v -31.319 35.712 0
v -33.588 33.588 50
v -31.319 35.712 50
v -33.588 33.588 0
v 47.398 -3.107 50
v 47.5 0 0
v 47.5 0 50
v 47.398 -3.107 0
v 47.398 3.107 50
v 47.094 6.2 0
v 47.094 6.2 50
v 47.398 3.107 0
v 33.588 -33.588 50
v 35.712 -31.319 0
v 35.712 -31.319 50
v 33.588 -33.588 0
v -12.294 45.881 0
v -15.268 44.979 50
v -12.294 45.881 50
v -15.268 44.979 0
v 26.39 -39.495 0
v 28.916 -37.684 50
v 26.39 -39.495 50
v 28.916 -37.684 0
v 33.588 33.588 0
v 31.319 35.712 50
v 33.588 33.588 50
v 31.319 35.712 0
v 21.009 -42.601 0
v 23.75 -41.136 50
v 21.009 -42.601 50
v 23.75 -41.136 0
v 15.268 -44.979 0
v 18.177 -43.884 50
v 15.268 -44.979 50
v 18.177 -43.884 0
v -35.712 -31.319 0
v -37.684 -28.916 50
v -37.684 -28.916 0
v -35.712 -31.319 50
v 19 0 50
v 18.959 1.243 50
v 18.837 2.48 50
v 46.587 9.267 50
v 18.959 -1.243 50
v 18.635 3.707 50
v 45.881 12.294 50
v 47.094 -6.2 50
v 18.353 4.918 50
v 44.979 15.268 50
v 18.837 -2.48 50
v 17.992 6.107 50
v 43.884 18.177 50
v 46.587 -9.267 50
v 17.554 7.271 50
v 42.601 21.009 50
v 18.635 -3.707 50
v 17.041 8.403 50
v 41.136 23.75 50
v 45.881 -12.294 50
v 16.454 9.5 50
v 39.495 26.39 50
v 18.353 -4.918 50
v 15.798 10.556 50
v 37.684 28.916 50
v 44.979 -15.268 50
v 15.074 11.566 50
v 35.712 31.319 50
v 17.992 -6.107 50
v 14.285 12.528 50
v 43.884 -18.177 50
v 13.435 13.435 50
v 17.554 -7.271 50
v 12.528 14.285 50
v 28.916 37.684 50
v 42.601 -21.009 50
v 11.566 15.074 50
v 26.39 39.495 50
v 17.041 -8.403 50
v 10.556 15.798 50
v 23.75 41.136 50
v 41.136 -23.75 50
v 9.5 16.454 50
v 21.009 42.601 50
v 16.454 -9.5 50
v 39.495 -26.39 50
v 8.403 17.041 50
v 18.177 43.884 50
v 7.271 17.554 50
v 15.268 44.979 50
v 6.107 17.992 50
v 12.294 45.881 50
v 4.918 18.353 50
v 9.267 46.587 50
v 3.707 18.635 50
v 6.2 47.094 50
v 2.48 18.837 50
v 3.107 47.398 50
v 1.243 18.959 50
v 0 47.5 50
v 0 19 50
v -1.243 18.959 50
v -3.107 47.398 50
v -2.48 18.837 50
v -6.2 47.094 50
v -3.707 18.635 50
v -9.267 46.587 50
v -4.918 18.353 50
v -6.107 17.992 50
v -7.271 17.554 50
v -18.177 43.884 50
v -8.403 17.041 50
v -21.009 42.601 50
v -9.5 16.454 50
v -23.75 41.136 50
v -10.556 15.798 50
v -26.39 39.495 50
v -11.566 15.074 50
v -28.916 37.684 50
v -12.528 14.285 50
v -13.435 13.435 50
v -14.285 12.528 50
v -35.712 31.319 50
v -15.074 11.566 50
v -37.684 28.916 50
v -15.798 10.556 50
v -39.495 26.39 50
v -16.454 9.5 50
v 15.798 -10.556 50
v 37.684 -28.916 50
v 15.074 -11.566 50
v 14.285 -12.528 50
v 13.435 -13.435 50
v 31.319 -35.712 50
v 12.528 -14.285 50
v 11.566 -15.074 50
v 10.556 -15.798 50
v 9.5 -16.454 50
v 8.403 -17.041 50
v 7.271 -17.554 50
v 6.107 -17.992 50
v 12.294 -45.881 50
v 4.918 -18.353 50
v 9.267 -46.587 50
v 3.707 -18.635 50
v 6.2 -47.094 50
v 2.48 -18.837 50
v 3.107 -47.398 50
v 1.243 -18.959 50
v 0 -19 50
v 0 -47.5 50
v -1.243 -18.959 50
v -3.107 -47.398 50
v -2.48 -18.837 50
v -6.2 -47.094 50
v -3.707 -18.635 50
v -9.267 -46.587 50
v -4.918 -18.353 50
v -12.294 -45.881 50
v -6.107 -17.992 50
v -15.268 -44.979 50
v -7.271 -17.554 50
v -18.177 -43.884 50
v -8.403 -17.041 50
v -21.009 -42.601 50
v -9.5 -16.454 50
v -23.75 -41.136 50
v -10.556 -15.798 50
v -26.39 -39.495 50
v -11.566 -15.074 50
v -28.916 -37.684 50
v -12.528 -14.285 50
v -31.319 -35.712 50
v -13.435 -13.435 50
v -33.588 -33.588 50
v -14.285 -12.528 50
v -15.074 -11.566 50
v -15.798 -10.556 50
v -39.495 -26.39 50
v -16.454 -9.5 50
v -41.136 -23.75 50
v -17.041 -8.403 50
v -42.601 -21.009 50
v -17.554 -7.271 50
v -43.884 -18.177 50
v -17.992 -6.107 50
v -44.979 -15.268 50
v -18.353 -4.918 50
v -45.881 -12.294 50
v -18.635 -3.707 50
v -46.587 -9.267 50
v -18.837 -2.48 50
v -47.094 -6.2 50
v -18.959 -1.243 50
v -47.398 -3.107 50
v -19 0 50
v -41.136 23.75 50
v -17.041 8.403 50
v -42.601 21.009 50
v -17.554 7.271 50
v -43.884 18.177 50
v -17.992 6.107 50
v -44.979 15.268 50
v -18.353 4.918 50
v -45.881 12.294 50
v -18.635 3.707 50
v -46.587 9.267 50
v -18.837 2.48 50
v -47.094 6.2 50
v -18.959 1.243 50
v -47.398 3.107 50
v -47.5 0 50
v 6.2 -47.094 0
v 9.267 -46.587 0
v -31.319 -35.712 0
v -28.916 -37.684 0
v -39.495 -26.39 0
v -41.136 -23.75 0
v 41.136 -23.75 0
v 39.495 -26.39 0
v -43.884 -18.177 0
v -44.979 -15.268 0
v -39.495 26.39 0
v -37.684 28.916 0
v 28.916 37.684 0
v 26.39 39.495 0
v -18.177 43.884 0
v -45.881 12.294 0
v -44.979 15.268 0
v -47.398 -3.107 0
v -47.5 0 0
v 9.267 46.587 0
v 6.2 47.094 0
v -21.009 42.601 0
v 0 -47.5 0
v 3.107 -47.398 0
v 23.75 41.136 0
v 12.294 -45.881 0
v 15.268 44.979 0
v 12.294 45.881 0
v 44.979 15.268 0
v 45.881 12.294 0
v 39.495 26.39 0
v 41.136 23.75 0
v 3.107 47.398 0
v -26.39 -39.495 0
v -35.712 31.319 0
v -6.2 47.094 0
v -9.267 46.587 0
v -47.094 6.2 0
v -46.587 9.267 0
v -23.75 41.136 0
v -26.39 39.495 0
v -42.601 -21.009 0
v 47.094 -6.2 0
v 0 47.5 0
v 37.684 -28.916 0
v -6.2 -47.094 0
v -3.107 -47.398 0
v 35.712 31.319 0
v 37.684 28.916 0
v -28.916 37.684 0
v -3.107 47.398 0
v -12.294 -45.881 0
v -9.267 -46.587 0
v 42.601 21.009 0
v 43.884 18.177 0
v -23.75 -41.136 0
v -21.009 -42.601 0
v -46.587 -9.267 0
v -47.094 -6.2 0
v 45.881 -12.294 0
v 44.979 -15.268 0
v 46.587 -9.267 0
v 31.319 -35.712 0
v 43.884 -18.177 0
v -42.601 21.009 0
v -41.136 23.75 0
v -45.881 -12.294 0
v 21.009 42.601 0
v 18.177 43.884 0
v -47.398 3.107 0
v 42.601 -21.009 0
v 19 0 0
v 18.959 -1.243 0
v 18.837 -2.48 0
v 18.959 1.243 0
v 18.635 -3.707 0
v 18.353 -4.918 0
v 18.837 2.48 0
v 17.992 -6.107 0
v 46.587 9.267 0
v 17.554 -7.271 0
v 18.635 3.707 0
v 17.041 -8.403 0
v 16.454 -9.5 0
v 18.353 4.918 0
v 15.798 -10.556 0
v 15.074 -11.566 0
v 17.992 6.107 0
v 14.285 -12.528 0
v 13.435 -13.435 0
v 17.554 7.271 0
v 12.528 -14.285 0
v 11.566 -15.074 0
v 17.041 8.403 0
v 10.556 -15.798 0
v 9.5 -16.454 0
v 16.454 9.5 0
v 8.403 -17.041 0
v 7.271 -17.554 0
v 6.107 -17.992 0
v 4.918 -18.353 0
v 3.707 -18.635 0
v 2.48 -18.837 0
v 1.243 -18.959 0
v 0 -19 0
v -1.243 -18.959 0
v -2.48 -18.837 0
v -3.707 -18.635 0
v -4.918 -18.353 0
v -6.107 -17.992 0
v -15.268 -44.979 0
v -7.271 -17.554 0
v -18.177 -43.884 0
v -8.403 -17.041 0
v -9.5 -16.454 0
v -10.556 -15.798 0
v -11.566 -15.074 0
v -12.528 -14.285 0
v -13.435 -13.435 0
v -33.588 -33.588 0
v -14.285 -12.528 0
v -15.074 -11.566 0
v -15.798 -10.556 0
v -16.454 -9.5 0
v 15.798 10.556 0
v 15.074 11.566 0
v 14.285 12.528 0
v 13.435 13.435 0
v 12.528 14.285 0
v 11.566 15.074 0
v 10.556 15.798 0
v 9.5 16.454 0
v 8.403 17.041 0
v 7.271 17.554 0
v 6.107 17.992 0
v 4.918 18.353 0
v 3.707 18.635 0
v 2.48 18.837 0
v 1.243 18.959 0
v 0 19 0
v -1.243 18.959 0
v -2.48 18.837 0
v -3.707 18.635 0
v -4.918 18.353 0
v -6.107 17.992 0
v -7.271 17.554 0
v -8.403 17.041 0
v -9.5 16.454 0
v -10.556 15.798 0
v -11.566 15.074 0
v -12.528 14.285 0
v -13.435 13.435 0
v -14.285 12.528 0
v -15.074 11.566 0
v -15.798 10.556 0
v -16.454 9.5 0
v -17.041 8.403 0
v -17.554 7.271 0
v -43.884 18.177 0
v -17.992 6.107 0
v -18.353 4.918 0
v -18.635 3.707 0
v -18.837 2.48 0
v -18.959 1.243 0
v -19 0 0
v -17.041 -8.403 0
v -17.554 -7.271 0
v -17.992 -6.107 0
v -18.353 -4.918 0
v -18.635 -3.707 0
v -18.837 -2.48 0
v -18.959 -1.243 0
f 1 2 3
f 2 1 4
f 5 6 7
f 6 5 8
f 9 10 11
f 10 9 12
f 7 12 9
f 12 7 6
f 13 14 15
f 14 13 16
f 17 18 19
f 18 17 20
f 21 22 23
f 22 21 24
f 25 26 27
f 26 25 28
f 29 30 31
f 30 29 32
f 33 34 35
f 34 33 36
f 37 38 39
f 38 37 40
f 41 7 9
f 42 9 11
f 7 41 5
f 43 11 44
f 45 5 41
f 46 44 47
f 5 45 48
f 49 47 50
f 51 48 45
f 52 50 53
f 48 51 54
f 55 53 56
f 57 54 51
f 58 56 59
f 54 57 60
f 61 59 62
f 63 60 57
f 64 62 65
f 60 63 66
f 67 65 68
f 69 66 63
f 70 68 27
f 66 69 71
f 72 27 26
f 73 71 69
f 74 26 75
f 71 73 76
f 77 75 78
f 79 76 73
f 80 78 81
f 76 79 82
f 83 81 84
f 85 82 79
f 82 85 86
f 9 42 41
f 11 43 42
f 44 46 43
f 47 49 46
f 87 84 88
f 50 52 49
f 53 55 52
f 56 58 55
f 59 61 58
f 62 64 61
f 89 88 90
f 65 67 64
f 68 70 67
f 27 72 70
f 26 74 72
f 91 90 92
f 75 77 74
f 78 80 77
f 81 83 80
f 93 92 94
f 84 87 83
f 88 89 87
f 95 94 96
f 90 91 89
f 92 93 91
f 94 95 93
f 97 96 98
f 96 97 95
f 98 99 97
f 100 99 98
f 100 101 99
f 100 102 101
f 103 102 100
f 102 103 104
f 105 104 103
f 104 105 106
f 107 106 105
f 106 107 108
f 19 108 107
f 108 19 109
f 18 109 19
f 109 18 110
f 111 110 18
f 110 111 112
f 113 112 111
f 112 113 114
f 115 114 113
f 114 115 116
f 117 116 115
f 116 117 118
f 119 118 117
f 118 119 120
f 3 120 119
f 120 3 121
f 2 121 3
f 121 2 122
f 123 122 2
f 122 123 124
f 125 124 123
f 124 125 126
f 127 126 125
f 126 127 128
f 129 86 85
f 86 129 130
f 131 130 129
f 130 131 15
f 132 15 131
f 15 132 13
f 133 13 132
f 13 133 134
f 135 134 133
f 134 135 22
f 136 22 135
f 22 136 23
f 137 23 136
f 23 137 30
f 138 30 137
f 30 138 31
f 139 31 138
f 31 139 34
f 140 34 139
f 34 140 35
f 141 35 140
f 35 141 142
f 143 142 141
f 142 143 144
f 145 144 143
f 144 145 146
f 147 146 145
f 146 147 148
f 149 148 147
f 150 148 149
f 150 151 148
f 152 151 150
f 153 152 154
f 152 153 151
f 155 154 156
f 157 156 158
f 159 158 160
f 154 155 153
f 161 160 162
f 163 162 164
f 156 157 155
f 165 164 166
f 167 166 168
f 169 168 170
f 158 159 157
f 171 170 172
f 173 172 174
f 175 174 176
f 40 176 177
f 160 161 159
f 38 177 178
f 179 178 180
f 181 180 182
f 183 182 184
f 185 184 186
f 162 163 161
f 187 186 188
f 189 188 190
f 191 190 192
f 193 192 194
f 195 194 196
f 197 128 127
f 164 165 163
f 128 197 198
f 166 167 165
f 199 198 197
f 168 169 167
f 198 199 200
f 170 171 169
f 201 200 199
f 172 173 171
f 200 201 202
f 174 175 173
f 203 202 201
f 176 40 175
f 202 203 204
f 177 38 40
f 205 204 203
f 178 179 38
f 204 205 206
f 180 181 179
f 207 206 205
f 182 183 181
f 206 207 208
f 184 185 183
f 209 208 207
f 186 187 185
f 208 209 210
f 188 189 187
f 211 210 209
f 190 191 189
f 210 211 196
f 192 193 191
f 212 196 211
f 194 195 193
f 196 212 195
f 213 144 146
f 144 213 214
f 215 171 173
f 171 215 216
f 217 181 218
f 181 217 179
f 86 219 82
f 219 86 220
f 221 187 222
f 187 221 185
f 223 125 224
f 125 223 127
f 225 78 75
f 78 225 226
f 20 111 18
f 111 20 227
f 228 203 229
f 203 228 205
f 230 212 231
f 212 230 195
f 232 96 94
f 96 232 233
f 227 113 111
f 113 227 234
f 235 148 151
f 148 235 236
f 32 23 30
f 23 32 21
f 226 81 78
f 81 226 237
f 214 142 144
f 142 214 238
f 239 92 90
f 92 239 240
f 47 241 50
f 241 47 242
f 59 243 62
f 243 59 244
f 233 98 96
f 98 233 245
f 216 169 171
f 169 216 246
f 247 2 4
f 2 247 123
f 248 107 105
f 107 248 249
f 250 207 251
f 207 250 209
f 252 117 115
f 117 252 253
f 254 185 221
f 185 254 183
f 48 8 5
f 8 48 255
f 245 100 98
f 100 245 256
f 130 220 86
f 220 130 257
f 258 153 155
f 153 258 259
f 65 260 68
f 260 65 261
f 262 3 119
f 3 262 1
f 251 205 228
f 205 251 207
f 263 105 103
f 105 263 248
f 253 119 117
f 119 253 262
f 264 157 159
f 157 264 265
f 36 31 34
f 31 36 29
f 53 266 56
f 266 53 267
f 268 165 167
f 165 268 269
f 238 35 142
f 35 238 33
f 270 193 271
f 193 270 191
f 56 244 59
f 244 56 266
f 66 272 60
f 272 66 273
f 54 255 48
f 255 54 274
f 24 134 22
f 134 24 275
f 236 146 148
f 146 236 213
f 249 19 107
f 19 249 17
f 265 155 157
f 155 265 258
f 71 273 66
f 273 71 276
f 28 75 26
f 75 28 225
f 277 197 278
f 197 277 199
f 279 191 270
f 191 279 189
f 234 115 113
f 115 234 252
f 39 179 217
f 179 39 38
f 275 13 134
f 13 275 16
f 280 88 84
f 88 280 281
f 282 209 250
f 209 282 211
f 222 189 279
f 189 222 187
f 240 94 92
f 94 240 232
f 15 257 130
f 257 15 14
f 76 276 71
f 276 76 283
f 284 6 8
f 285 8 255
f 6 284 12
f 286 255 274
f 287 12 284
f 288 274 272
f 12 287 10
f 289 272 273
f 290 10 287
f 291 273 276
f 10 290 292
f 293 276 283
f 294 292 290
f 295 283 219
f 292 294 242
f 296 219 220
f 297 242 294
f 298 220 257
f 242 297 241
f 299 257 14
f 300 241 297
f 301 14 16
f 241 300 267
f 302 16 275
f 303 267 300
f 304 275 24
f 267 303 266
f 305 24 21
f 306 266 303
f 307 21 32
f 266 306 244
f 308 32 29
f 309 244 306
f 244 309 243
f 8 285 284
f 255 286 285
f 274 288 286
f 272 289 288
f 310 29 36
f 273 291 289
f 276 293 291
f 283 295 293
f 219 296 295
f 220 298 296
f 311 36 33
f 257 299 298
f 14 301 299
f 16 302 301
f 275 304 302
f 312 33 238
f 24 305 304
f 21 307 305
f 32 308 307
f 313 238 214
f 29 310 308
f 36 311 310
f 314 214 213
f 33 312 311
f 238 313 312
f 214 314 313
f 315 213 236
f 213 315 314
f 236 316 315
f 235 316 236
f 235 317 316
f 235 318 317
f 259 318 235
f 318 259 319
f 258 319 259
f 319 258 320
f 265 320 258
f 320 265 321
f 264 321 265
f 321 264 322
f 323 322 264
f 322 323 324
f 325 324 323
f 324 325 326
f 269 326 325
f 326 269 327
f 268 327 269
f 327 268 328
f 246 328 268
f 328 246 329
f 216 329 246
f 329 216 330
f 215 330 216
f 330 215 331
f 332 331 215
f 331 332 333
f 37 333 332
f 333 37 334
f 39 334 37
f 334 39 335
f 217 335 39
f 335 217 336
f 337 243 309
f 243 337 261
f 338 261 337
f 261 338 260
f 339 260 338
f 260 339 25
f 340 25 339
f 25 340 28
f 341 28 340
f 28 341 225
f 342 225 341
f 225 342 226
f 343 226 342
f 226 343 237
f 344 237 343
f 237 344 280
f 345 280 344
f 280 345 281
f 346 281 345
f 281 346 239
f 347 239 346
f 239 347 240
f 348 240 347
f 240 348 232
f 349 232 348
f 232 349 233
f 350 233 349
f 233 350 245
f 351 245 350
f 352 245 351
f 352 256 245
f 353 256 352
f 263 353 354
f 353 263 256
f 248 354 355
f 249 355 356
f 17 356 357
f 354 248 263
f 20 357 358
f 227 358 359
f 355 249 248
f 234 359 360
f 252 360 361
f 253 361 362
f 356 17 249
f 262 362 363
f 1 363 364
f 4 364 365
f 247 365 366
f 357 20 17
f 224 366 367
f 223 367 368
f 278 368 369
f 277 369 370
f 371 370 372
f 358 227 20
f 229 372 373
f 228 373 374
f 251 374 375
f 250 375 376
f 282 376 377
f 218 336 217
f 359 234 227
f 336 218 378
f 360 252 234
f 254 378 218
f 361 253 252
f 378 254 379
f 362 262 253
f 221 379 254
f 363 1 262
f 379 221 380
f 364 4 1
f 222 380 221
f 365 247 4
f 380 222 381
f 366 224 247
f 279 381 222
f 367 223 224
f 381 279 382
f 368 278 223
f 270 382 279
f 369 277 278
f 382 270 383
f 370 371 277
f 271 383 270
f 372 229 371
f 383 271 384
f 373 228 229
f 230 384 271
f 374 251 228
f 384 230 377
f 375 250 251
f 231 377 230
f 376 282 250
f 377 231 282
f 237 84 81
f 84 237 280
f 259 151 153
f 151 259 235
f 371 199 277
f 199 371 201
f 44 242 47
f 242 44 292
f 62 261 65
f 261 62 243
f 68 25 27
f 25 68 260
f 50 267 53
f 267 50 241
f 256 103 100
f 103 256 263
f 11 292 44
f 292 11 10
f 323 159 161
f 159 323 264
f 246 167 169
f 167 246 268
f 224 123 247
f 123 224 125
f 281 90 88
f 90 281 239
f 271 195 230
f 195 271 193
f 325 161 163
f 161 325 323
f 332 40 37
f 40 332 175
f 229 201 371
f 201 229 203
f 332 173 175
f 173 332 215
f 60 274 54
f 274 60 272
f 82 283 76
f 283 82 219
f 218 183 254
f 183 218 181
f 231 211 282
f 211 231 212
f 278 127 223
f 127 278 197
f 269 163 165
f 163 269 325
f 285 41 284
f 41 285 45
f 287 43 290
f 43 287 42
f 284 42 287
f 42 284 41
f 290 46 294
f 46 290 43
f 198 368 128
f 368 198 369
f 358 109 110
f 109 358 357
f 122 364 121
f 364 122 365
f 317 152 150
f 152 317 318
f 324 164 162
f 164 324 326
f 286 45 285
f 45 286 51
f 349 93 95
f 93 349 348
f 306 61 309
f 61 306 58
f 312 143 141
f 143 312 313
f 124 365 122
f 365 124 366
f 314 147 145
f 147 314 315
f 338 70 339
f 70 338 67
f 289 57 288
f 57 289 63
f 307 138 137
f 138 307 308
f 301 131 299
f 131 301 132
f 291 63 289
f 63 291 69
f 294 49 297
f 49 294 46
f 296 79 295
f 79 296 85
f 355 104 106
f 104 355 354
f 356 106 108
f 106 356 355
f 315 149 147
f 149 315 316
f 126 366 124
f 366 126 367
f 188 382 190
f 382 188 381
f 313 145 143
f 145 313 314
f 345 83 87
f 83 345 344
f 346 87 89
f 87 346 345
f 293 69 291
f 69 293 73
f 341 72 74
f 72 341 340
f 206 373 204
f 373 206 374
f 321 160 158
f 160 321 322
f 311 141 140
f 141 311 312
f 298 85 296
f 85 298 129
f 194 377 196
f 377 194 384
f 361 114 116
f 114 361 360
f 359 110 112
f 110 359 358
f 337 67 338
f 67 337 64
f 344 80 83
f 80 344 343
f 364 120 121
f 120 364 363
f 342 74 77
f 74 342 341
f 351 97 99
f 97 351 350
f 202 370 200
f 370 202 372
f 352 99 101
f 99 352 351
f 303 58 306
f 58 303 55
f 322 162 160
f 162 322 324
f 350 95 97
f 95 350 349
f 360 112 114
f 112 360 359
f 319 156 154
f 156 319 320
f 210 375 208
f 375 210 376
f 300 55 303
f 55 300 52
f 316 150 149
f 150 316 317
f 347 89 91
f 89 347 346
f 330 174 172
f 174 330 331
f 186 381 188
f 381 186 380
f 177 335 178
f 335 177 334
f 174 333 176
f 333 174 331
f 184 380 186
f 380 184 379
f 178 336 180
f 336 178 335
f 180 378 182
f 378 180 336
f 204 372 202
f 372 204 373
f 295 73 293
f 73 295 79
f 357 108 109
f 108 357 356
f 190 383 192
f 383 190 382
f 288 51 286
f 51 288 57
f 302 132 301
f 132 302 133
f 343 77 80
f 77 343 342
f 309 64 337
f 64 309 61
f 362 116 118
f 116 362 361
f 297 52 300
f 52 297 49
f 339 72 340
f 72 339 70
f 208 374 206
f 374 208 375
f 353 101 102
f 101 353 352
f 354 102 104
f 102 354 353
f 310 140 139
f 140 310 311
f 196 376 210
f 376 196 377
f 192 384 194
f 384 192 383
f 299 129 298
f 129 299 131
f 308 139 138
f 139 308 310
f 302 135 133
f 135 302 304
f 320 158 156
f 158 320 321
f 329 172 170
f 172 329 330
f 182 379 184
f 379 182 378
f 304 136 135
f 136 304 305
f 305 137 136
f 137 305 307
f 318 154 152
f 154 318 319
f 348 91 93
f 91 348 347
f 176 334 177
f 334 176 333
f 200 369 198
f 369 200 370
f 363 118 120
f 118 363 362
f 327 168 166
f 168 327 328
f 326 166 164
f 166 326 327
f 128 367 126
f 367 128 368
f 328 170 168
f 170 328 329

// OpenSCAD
$fn=96;

// Sellotape tape roll (adhesive tape on a cardboard core)

outer_d = 95;          // overall outer diameter of tape roll (mm)
inner_d = 38;          // inner diameter of cardboard core (mm)
width   = 50;          // tape width (mm)

core_wall = 2.5;       // cardboard wall thickness (mm)
tape_radial_thickness = (outer_d - inner_d)/2 - core_wall; // remaining radial thickness for tape

module ring(od, id, h){
    difference(){
        cylinder(d=od, h=h);
        translate([0,0,-0.2]) cylinder(d=id, h=h+0.4);
    }
}

module sellotape_roll(){
    // Tape body (slightly translucent)
    color([0.98, 0.98, 0.92, 0.35])
        ring(outer_d, inner_d + 2*core_wall, width);

    // Cardboard core
    color([0.78, 0.70, 0.55, 1.0])
        ring(inner_d + 2*core_wall, inner_d, width);

    // Subtle edge bevels for realism
    bevel = 1.2;
    color([0.98, 0.98, 0.92, 0.25])
    difference(){
        // outer bevel
        union(){
            translate([0,0,0]) cylinder(d=outer_d, h=bevel);
            translate([0,0,width-bevel]) cylinder(d=outer_d, h=bevel);
        }
        translate([0,0,-0.2]) cylinder(d=outer_d-2*bevel, h=width+0.4);
        translate([0,0,-0.2]) cylinder(d=inner_d + 2*core_wall, h=width+0.4);
    }
}

sellotape_roll();
